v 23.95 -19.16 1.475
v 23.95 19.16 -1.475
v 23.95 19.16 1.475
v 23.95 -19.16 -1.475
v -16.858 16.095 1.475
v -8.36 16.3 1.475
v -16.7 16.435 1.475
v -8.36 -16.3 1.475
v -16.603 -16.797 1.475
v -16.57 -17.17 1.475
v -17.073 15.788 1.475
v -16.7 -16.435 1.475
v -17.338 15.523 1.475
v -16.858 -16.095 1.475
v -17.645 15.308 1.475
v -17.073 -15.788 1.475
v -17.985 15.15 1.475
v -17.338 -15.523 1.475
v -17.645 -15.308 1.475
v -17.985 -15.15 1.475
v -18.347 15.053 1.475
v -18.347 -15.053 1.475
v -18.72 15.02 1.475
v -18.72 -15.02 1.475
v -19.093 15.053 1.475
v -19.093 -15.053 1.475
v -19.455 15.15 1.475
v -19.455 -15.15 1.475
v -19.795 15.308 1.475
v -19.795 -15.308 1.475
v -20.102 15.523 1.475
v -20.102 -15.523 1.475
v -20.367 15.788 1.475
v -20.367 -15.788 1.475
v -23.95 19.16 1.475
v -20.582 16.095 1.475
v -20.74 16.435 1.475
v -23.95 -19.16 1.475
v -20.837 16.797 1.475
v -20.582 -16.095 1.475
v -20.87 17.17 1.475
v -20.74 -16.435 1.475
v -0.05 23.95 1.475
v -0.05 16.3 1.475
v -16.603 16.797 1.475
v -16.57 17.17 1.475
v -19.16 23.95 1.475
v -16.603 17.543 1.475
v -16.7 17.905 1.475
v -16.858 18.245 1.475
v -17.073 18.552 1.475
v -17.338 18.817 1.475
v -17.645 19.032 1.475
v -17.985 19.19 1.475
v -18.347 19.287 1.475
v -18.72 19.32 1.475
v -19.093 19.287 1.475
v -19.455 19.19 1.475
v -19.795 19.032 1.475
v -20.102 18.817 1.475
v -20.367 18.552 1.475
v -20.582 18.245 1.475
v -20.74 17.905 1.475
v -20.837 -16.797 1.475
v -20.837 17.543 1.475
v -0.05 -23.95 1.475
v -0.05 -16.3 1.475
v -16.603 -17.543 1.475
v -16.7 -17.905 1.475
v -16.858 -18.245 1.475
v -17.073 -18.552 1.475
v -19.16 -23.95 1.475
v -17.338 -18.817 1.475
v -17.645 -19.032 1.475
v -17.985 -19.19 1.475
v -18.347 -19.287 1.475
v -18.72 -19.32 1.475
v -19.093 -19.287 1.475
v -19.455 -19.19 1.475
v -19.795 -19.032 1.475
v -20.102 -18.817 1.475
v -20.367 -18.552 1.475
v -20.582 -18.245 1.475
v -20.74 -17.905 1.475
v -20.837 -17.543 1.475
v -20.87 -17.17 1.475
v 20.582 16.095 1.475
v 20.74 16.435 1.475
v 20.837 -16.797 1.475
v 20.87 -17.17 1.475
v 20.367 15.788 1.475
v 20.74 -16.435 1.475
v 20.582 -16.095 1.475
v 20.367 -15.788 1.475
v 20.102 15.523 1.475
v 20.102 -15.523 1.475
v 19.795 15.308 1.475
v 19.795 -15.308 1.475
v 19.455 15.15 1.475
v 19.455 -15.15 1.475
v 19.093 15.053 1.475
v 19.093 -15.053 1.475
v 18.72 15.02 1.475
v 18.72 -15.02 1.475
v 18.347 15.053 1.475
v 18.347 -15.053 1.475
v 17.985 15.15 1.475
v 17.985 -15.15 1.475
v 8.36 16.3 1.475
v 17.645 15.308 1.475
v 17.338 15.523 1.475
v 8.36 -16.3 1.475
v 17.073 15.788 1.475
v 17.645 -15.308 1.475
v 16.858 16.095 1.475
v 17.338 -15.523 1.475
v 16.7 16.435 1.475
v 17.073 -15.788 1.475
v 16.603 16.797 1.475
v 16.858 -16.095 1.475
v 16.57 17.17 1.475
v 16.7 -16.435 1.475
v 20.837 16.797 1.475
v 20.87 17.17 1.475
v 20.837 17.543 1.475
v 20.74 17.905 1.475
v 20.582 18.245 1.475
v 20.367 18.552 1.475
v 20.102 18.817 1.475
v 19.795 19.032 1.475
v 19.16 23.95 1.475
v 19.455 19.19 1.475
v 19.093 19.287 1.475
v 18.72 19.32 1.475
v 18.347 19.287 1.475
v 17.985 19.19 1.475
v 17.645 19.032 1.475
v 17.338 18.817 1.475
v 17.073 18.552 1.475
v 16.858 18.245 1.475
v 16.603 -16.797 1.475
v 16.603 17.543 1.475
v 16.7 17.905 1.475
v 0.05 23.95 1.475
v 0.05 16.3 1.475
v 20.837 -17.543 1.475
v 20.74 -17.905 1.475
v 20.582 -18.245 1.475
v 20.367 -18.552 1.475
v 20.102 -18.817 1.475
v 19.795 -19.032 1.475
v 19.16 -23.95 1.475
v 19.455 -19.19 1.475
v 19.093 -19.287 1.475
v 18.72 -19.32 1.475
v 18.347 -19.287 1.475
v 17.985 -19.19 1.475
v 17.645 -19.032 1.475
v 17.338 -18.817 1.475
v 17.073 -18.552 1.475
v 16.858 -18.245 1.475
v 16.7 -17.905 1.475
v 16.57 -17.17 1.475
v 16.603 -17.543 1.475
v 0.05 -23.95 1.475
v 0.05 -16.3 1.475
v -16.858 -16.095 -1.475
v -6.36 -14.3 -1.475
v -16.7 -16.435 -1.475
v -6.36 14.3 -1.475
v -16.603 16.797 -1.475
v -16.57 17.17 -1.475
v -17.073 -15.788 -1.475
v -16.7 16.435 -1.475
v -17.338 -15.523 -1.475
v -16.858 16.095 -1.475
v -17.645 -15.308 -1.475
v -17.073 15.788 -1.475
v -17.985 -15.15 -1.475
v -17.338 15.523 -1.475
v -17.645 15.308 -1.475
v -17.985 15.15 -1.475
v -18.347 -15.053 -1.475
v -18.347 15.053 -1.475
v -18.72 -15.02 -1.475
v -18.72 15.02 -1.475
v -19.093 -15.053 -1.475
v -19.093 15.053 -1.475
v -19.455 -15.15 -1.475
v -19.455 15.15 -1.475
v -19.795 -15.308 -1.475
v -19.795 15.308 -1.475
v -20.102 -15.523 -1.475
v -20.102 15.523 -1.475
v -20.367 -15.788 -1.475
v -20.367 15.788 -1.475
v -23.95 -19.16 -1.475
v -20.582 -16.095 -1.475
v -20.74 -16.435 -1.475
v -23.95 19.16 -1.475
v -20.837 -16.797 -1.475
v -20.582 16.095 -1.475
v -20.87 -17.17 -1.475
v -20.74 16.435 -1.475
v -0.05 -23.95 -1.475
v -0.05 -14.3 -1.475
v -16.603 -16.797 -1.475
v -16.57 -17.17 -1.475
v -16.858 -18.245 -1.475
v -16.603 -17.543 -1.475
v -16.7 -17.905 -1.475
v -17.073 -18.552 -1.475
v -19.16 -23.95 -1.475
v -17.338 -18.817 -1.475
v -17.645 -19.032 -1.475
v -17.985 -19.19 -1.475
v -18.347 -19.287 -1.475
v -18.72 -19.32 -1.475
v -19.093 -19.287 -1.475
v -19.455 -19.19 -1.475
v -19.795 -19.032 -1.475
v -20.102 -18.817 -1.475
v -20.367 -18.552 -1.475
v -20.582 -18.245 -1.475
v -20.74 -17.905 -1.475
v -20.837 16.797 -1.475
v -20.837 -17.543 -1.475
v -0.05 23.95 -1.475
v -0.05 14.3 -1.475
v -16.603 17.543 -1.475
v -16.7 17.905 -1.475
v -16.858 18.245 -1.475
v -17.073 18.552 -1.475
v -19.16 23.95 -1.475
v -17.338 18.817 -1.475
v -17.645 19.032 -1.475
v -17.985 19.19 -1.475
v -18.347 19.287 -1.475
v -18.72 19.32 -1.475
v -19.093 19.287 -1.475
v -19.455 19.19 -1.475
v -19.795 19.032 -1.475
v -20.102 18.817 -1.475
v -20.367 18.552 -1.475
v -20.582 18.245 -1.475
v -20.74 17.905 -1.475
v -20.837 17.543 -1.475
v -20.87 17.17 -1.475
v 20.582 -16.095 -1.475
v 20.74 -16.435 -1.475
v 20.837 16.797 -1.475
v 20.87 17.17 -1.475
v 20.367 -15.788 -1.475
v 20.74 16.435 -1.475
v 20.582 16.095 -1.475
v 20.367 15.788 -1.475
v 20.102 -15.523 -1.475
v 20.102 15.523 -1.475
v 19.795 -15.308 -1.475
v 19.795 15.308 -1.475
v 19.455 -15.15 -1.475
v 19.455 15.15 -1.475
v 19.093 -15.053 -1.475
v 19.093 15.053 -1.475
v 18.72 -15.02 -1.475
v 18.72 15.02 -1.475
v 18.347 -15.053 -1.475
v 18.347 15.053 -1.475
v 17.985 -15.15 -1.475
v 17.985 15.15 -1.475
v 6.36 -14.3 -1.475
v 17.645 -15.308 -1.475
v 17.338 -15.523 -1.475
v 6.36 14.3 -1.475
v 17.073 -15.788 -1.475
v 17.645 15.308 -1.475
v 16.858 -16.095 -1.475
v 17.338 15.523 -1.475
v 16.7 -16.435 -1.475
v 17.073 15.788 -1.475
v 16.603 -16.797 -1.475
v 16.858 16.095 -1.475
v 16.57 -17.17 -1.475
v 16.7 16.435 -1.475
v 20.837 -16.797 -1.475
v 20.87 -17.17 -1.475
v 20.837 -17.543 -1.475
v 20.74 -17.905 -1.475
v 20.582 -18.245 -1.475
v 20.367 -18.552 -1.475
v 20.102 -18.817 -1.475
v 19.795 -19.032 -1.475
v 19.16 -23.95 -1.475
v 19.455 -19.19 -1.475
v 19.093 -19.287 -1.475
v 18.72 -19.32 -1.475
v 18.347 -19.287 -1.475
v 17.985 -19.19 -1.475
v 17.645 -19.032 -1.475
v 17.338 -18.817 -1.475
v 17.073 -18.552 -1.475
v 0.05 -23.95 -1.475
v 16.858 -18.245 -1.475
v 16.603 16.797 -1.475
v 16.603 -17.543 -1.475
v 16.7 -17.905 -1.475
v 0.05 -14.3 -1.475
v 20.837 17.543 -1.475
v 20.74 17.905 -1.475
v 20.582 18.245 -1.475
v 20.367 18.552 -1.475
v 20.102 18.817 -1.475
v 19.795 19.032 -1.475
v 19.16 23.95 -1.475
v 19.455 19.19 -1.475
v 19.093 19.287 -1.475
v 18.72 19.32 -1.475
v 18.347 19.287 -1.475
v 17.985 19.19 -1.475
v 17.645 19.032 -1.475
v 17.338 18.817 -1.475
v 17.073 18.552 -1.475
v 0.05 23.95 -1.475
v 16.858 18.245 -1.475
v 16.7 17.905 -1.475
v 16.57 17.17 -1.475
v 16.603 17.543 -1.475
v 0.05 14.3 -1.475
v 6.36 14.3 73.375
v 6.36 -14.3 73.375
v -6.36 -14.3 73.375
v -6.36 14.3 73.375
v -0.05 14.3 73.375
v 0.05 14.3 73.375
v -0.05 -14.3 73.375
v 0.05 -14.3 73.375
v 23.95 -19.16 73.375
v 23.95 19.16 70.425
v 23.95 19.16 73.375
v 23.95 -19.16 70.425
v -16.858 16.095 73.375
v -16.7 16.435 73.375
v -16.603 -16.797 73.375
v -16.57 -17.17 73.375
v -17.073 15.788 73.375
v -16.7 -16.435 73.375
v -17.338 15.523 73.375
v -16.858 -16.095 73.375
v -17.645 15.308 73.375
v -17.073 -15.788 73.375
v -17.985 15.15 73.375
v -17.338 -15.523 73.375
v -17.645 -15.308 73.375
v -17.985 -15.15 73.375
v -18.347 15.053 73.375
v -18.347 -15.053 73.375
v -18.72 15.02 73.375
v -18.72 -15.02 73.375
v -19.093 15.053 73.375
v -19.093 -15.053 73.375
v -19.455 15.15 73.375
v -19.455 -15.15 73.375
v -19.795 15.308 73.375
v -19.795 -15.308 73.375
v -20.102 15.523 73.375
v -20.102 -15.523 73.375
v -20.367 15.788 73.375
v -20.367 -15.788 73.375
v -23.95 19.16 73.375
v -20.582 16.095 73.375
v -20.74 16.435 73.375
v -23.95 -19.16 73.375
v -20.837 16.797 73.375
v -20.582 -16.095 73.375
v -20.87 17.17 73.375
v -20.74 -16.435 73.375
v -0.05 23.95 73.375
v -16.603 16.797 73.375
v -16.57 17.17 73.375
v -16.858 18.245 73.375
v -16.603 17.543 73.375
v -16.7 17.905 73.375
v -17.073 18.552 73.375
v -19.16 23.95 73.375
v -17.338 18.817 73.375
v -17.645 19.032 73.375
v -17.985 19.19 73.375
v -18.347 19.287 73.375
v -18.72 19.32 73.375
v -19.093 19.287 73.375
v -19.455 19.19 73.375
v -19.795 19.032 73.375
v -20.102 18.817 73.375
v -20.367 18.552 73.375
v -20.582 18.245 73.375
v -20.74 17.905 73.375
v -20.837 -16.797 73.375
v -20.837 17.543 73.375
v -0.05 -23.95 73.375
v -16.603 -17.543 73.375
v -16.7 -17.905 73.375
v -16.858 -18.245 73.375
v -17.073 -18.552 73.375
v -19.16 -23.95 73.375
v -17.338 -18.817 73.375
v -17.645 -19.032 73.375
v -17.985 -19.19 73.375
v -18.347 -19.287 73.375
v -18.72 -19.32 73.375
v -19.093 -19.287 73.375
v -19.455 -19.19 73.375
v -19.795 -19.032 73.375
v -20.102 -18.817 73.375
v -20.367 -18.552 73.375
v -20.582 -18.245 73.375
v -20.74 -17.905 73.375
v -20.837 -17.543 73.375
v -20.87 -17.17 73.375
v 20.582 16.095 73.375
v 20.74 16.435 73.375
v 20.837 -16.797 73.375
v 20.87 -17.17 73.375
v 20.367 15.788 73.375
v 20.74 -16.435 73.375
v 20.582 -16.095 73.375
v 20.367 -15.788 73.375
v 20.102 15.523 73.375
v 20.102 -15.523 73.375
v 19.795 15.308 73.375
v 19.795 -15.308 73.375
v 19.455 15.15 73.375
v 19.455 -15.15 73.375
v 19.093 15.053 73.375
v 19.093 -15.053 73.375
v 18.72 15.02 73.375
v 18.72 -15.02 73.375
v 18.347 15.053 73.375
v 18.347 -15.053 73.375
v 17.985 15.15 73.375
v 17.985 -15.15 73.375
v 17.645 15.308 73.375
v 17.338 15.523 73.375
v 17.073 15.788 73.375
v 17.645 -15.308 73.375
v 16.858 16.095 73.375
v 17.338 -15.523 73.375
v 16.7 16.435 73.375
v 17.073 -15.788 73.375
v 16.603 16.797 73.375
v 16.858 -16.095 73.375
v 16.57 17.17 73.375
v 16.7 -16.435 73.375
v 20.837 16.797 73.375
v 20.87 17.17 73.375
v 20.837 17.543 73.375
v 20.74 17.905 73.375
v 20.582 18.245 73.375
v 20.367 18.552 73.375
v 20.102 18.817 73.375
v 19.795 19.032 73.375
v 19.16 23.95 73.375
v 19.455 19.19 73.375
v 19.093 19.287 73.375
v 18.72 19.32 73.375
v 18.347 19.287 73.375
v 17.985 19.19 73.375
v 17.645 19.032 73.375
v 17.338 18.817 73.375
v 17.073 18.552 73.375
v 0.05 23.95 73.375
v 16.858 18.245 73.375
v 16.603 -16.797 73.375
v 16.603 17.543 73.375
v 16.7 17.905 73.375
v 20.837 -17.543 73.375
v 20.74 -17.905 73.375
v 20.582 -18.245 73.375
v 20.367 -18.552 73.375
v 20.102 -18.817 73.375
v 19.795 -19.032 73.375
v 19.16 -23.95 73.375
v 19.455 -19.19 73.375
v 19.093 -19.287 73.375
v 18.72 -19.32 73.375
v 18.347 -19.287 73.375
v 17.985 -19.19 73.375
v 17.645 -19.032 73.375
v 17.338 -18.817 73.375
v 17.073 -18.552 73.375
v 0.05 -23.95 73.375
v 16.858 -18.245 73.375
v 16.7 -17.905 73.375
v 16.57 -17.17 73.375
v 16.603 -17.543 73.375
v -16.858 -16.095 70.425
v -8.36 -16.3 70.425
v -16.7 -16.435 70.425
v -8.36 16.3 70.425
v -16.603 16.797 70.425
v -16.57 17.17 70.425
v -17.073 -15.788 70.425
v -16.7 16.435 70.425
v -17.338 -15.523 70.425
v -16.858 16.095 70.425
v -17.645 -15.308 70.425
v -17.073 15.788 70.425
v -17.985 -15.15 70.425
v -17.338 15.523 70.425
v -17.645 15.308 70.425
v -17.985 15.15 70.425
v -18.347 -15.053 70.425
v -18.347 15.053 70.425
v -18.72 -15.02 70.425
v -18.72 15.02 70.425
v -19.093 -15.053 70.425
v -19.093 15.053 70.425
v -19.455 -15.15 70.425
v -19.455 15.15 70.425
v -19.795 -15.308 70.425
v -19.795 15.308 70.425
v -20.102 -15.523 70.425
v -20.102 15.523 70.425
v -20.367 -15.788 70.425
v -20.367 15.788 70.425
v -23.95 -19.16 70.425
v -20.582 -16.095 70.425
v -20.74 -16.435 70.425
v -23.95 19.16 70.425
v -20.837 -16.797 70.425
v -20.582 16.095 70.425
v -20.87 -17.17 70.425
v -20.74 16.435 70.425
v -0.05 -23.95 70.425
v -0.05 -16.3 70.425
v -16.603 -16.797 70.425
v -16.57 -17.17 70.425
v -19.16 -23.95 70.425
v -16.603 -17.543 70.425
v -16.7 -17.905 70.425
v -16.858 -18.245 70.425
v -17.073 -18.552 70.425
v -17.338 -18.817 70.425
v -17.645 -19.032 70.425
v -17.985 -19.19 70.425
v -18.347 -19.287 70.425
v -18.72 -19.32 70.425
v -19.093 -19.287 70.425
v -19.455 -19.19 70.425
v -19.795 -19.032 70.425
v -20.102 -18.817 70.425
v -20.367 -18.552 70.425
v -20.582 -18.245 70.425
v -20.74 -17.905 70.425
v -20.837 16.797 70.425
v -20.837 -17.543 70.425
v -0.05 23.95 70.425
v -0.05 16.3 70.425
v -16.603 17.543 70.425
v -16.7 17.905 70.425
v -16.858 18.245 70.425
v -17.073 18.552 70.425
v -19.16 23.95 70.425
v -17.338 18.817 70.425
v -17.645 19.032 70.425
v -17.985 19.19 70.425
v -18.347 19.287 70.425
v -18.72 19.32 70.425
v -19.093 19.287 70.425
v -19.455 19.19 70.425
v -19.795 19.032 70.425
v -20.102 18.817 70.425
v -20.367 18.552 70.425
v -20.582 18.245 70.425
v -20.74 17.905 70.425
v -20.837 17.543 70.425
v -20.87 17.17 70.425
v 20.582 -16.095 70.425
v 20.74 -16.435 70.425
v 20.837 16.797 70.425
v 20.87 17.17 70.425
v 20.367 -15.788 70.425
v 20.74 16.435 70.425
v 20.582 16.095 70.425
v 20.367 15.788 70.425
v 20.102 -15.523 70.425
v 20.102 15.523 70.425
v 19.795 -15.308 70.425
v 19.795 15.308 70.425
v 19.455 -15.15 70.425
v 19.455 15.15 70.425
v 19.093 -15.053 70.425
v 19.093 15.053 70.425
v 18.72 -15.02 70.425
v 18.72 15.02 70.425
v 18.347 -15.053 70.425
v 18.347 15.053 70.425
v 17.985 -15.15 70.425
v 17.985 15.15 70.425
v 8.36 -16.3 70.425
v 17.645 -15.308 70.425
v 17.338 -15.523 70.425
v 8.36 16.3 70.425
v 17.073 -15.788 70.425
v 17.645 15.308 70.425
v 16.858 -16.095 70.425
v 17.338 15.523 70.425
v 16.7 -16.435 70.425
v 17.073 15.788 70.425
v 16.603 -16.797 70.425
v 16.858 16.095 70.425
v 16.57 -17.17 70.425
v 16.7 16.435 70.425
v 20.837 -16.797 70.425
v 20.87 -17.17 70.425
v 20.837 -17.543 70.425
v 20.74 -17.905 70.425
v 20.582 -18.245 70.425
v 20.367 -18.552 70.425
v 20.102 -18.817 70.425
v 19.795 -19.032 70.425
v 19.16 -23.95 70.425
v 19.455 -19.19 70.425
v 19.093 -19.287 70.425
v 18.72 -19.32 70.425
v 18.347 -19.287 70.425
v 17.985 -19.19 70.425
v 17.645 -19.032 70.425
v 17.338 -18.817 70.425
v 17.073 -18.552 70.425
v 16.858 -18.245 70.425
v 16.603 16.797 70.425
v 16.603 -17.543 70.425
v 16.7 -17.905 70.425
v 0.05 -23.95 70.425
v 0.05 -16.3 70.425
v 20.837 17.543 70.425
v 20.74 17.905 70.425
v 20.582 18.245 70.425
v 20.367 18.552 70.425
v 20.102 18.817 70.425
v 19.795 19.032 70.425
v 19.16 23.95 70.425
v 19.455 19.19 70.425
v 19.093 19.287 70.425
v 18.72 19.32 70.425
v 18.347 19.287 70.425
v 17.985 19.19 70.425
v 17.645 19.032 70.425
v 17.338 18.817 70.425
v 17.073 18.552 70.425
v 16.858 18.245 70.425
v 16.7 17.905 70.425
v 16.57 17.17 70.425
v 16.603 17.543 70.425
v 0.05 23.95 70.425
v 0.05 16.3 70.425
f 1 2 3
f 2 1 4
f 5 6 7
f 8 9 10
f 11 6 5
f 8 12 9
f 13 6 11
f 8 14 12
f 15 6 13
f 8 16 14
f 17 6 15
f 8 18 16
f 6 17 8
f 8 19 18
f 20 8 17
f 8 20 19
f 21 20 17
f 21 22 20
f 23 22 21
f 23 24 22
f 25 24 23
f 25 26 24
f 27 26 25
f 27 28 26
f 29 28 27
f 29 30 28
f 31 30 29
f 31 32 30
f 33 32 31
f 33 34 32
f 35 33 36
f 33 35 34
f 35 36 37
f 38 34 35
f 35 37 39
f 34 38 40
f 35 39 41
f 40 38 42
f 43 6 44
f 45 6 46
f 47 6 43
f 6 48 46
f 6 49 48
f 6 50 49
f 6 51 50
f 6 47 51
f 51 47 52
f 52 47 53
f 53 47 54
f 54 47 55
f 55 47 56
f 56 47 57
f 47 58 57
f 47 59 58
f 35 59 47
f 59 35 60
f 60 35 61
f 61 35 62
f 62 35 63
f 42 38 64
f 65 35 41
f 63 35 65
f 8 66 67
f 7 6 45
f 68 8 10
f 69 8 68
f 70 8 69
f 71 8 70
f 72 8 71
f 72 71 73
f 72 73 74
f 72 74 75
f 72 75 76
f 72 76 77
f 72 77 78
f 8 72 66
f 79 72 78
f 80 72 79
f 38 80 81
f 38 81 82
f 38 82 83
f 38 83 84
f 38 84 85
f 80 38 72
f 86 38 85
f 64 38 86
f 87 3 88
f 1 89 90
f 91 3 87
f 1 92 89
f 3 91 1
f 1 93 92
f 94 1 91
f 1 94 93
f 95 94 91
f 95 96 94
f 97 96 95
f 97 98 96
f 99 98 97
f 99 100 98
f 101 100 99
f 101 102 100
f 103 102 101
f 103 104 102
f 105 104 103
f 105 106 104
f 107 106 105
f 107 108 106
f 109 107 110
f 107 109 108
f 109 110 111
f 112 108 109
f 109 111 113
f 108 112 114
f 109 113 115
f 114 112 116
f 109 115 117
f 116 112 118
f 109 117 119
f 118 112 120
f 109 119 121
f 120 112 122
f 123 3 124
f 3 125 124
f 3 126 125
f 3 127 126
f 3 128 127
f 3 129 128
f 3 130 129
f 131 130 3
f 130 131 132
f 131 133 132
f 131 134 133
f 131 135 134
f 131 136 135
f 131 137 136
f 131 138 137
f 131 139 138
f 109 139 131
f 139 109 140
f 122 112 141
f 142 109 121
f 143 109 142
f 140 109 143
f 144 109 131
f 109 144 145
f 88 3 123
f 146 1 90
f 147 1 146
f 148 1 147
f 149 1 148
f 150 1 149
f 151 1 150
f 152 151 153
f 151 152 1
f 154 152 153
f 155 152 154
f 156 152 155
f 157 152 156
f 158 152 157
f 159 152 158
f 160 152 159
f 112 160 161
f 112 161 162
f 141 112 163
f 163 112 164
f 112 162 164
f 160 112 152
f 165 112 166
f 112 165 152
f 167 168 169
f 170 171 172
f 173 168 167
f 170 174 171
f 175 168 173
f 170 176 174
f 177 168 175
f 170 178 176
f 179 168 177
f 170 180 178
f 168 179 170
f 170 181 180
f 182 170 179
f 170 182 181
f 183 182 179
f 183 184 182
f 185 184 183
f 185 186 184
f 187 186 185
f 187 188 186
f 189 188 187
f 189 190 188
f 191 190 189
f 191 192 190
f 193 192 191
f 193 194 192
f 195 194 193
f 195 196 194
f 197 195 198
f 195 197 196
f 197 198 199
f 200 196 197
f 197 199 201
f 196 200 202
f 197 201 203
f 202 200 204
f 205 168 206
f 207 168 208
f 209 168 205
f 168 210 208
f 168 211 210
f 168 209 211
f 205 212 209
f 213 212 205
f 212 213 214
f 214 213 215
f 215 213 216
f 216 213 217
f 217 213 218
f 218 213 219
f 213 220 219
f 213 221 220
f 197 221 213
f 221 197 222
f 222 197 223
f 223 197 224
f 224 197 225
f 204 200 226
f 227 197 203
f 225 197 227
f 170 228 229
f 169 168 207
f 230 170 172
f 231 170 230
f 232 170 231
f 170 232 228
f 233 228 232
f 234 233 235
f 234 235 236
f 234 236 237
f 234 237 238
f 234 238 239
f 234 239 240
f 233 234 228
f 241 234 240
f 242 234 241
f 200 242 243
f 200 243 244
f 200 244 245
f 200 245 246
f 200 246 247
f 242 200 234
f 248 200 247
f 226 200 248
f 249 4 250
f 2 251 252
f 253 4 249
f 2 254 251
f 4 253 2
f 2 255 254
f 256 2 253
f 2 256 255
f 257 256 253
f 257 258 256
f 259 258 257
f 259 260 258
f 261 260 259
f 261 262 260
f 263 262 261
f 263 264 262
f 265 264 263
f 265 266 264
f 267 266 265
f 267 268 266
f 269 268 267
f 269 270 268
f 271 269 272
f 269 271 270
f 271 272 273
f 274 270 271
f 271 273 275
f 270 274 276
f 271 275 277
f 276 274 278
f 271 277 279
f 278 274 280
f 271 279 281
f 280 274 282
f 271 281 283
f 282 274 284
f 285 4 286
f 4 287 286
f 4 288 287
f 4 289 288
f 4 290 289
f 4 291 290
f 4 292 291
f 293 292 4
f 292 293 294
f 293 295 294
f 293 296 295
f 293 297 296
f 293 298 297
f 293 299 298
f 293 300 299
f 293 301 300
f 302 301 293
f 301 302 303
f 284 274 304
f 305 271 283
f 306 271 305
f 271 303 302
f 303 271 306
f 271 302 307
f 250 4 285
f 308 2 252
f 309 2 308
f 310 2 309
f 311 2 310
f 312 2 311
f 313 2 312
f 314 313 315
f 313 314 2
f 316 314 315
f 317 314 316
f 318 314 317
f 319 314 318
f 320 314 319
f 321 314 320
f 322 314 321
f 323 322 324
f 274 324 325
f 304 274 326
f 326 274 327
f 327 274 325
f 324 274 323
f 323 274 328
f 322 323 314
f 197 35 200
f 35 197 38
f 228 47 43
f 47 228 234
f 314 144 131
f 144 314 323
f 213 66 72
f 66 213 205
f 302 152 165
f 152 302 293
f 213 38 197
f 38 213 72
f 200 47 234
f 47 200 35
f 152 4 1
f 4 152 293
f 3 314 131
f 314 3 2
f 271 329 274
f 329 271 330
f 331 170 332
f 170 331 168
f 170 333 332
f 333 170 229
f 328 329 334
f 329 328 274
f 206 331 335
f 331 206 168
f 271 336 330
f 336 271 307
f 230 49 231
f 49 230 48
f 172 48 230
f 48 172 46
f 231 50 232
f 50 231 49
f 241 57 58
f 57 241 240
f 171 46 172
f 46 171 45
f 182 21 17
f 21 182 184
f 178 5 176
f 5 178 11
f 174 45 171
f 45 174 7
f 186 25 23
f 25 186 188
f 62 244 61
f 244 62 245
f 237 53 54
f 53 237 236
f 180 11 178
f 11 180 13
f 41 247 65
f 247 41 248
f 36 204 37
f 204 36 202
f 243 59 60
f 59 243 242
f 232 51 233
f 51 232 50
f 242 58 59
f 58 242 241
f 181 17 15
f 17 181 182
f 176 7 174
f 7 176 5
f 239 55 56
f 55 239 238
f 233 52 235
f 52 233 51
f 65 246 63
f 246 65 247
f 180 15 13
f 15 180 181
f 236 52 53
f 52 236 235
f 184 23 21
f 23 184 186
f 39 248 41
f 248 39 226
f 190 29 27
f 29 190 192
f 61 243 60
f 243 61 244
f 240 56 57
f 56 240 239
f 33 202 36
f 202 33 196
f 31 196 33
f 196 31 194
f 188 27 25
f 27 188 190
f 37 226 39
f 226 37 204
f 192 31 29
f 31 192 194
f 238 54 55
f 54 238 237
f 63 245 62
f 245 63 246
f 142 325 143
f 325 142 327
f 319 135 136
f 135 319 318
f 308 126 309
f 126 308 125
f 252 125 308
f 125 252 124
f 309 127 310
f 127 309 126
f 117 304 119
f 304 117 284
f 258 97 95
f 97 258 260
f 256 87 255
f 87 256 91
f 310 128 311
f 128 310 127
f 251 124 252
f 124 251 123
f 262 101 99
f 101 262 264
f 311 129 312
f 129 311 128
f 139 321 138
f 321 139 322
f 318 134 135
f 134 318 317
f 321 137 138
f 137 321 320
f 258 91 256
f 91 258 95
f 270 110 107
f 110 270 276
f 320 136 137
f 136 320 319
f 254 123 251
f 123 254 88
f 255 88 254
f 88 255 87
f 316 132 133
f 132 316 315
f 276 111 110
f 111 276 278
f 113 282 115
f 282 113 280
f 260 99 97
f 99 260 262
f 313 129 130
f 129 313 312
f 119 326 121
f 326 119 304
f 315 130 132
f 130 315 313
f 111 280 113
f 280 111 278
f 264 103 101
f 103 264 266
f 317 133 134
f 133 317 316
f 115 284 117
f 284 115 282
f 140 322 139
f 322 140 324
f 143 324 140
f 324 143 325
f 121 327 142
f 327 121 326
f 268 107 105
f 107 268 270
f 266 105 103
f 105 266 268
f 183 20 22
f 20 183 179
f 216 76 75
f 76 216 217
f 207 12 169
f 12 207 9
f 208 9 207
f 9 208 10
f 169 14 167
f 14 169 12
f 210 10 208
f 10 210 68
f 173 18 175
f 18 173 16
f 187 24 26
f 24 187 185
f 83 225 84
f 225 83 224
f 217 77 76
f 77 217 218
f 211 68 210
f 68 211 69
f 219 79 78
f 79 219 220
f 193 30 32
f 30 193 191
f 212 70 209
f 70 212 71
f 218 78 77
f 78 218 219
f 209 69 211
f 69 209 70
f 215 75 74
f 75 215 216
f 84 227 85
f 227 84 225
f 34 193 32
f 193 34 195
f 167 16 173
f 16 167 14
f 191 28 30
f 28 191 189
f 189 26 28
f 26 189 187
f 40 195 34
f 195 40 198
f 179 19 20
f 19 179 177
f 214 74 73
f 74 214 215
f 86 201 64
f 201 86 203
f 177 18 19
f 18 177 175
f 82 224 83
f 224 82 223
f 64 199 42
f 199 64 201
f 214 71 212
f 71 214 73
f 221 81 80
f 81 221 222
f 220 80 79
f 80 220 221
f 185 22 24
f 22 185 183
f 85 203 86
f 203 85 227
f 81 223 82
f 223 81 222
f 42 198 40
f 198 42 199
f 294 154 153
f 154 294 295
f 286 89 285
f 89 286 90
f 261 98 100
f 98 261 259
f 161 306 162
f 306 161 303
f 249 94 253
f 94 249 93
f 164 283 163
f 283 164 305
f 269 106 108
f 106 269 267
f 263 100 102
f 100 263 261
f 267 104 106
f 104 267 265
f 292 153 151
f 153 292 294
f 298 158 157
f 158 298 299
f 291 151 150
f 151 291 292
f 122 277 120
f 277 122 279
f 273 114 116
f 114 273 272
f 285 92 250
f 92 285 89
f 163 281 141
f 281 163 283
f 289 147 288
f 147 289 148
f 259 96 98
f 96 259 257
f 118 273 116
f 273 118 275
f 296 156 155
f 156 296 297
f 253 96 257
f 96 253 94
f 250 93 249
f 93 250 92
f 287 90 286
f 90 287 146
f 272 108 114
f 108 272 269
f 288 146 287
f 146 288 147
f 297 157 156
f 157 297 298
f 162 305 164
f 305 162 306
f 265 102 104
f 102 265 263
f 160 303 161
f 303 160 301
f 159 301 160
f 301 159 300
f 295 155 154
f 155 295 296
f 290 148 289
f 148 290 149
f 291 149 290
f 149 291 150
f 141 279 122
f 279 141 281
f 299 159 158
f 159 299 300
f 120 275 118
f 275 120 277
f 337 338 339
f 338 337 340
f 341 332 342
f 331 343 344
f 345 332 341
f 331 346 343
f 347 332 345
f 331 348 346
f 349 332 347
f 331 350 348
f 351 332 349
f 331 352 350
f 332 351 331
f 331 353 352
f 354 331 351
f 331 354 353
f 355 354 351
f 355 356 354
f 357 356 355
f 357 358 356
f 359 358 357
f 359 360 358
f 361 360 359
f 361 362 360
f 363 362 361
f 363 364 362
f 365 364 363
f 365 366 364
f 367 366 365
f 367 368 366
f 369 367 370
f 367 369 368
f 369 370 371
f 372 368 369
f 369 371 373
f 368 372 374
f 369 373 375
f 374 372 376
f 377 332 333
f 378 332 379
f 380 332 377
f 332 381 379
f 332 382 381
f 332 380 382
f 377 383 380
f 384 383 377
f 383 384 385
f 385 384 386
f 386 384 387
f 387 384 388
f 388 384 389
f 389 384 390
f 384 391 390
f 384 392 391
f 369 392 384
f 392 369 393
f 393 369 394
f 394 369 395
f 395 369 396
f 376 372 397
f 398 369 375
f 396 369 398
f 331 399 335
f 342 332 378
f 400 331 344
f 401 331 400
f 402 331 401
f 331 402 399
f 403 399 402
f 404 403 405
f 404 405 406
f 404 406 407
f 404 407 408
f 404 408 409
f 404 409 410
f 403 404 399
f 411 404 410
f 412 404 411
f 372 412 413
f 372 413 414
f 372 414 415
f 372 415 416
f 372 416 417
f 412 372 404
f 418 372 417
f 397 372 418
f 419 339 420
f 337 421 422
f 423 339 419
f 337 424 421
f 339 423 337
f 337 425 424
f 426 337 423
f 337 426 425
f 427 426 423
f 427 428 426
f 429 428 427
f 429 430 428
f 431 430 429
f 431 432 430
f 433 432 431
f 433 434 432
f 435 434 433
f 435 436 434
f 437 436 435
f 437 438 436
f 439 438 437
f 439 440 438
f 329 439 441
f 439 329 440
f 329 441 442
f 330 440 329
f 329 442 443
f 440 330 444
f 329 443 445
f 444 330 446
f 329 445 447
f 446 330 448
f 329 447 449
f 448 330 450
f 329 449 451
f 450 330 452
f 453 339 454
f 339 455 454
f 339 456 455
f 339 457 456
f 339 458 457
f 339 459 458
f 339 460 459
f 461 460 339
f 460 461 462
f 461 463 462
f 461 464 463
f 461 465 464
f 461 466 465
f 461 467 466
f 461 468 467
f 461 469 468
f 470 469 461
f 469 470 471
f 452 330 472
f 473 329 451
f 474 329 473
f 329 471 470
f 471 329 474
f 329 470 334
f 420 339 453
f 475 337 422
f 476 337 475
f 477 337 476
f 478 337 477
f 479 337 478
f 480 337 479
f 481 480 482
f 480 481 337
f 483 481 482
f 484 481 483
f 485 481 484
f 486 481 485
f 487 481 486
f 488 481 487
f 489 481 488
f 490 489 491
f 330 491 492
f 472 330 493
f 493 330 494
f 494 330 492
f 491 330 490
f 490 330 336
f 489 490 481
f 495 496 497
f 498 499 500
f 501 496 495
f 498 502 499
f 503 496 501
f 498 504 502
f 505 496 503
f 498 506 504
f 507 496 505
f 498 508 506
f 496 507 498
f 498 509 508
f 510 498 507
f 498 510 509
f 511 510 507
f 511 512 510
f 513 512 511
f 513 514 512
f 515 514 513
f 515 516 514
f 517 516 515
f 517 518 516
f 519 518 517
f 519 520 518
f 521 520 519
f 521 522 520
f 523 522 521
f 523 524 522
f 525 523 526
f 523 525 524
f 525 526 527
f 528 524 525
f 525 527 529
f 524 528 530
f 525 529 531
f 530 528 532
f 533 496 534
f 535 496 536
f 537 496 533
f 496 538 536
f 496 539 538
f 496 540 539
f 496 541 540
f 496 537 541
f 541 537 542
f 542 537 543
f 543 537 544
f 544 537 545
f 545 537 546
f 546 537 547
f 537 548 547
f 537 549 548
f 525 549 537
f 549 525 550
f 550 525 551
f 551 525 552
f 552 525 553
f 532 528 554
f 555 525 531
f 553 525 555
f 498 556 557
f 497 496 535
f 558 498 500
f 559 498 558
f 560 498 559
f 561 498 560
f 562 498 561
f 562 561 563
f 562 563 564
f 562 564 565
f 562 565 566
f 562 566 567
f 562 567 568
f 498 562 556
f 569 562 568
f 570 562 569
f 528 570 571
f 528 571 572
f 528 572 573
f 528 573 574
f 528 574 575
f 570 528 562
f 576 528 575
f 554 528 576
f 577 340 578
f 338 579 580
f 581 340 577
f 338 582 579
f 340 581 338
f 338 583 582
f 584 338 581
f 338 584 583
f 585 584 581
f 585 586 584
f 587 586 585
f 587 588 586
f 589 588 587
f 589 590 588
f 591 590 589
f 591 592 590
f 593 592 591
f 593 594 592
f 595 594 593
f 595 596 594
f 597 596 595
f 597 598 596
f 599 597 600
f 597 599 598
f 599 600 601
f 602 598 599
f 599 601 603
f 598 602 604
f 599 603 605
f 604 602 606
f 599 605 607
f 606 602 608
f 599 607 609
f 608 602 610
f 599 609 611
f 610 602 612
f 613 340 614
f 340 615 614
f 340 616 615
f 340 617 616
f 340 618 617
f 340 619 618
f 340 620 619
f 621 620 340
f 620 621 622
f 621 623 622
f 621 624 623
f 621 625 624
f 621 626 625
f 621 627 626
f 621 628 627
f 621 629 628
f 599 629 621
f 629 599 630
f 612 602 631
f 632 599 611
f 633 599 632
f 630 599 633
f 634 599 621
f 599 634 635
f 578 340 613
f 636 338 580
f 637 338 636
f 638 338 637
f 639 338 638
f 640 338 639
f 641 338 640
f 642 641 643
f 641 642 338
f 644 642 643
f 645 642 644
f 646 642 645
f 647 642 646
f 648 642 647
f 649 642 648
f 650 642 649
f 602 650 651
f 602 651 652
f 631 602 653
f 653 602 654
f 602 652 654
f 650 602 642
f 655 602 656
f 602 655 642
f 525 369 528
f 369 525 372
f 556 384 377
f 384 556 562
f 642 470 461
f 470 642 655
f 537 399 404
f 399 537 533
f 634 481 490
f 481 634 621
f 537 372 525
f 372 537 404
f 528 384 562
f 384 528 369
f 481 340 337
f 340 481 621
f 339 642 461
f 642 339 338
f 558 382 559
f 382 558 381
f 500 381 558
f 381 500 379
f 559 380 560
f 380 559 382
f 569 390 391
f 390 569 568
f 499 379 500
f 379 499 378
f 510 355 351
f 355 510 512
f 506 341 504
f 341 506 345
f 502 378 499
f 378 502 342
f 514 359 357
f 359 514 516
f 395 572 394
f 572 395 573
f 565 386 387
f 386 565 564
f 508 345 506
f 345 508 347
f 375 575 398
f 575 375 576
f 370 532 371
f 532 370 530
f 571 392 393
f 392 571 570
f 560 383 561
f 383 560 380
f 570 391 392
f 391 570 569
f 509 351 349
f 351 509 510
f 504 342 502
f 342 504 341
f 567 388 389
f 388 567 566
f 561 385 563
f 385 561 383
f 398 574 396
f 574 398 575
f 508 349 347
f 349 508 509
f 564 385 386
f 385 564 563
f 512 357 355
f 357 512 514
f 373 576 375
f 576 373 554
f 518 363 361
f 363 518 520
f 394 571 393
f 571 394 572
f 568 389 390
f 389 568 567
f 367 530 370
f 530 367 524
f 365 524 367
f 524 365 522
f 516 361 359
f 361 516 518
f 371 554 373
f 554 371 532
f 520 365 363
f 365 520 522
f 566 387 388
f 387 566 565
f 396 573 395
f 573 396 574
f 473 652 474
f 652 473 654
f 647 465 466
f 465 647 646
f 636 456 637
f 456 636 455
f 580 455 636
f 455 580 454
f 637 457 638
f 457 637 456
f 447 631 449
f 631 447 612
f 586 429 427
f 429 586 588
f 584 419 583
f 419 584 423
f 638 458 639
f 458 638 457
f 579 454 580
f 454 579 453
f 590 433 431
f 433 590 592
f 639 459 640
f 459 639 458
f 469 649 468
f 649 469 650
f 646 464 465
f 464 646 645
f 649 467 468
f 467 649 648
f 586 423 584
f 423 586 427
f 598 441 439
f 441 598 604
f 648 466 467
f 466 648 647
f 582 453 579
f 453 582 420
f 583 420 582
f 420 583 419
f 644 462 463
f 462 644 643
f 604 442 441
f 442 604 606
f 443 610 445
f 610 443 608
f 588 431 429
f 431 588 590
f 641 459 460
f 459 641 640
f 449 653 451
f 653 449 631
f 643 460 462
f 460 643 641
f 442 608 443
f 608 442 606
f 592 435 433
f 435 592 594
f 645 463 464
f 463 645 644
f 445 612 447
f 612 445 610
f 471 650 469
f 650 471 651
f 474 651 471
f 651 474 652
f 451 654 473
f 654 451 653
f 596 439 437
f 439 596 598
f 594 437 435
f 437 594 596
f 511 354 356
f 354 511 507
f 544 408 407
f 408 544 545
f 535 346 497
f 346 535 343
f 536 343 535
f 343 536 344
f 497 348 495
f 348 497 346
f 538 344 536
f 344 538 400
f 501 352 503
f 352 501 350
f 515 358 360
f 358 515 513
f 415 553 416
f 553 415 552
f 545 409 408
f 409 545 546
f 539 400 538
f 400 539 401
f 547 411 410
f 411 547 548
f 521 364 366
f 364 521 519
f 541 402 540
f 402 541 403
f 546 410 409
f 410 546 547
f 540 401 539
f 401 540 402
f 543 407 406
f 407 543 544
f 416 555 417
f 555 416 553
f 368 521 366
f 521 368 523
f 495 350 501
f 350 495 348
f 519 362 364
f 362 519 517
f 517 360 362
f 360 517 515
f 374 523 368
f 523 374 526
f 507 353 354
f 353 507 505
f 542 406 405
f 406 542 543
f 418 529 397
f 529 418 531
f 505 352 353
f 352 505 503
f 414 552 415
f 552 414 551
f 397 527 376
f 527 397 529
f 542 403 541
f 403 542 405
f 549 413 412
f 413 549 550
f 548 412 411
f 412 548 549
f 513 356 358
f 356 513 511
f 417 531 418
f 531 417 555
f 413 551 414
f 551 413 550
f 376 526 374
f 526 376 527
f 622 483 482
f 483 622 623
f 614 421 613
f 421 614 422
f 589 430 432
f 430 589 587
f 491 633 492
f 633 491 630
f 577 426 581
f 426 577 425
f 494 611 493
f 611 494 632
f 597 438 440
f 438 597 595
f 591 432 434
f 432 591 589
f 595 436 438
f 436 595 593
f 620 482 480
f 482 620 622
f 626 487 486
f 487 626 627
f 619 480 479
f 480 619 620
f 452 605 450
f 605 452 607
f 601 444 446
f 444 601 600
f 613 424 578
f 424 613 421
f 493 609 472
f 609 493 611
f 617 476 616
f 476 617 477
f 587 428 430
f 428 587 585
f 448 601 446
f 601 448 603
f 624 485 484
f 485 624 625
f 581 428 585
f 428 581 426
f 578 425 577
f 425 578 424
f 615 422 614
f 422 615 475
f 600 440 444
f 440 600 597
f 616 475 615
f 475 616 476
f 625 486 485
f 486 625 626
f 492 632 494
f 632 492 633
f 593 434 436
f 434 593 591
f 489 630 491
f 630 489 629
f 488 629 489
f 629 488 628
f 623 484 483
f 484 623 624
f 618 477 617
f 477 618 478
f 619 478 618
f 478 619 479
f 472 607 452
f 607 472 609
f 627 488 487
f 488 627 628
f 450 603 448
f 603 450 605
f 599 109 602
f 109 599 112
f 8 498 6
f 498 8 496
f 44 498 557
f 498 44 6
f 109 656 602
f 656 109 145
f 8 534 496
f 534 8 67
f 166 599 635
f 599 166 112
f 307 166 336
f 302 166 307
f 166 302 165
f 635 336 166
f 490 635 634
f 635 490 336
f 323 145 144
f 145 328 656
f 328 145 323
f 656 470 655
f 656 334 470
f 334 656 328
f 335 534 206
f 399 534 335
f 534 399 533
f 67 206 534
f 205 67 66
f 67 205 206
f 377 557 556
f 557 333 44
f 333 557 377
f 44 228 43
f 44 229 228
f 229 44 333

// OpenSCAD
// file: common.scad
/**********************************************************************
 * Common waveguide code                                              *
 * NOTE: Must be included AFTER setting waveguide parameters          *
 * Perhaps in the future it could be useful to allow passing in these *
 * parameters to the modules themselves, removing this requirement.   *
 **********************************************************************/


/*             WR112   WR90   WR75   WR62   WR51   WR42   WR34  WR28 */
wrtab    = [0, 112,    90,    75,    62,    51,    42,    34,   28   ]*1.0; /* Waveguide type */
fstab    = [0,  47.9,  41.4,  38.3,  33.3,  31.0,  22.41, 22.1, 19.05]*1.0; /* Flange size */
fhstab   = [0,  18.72, 16.26, 14.25, 12.14, 11.25,  8.51,  7.9,  6.73]*1.0; /* Hole spacing short side */
fhltab   = [0,  17.17, 15.49, 13.21, 12.63, 10.29,  8.13,  7.5,  6.34]*1.0; /* Hole spacing long side */
drilltab = [0,   4.3,   4.3,   4.1,   4.1,   4.1,   3.1,   3.1,  3.0 ]*1.0; /* Hole size */
/* Not all waveguide opening sizes correspong 100% to the waveguide number */
wgatab   = [0,  28.50, 22.86, 19.05, 15.80, 12.95, 10.67,  8.64, 7.11]*1.0; /* Waveguide opening size A */
wgbtab   = [0,  12.62, 10.16,  9.53,  7.90,  6.48,  4.32,  4.32, 3.56]*1.0; /* Waveguide opening size B */


flange_size   = fstab[wrcode];        /* Square size of flange */
flange_hole_s = fhstab[wrcode];       /* Hole spacing on short side */
flange_hole_l = fhltab[wrcode];       /* Hole spacing on long side */
flange_drill  = drilltab[wrcode]/2.0; /* Flange mounting hole size */

wgsize_a = wgatab[wrcode] + (trim * 2);
wgsize_b = wgbtab[wrcode] + (trim * 2);

// faces for precision
$fn=36; // faces for precision

/* Create a waveguide flange
 *   Heavily based on code from Rolf-Dieter Klein (www.rdklein.de)
 *   https://www.thingiverse.com/thing:161428
 */
module flange() {
    thickness = flanged - trim;

    difference() {
        difference() {
            intersection() {
                cube([flange_size, flange_size, thickness], center=true);
                rotate([0,0,45])
                    cube([flange_size*1.4142*0.9,flange_size*1.4142*0.9,thickness],center=true);
            }
            cube([wgsize_b,wgsize_a,wall*2],center=true);
        }
        /* Holes */
        translate([-flange_hole_s,  flange_hole_l, 0]) cylinder(h=thickness*1.1, r=flange_drill, center=true);
        translate([ flange_hole_s,  flange_hole_l, 0]) cylinder(h=thickness*1.1, r=flange_drill, center=true);
        translate([-flange_hole_s, -flange_hole_l, 0]) cylinder(h=thickness*1.1, r=flange_drill, center=true);
        translate([ flange_hole_s, -flange_hole_l, 0]) cylinder(h=thickness*1.1, r=flange_drill, center=true);
    }
}

/* Create a flangeless section of waveguide
 *   wg_len: Length of section, in mm
 */
module waveguide(wg_len) {
    translate([0,0,wg_len/2]) {
        difference() {
            cube([wgsize_b+wall*2, wgsize_a+wall*2, wg_len],          center=true);
            cube([wgsize_b,        wgsize_a,        wg_len + wall*.1],center=true);
        }
    }
}

/* Generate horn antenna
 *   length:  Length of horn
 *   theta_h: Angle of horn in magnetic field
 *   theta_e: Angle of horn in electric field
 *
 * Polyhedron code loosely based off of code from Rolf-Dieter Klein (www.rdklein.de)
 *   https://www.thingiverse.com/thing:161428
 */
module horn(length, theta_h, theta_e) {
    /* Depth of horn that ends up inside waveguide */
    d_a = wgsize_a / (2 * tan(theta_h));
    d_b = wgsize_b / (2 * tan(theta_e));

    /* Size of horn opening */
    sz_a = wgsize_a + (2 * length * tan(theta_h));
    sz_b = wgsize_b + (2 * length * tan(theta_e));

    difference() {
        polyhedron(
            points = [
                /* Wide end */
                [ sz_b/2 + wall,  sz_a/2 + wall, length],
                [ sz_b/2 + wall, -sz_a/2 - wall, length],
                [-sz_b/2 - wall, -sz_a/2 - wall, length],
                [-sz_b/2 - wall,  sz_a/2 + wall, length],
                /* Small end */
                [ wgsize_b/2 + wall,  wgsize_a/2 + wall, 0],
                [ wgsize_b/2 + wall, -wgsize_a/2 - wall, 0],
                [-wgsize_b/2 - wall, -wgsize_a/2 - wall, 0],
                [-wgsize_b/2 - wall,  wgsize_a/2 + wall, 0]
            ],
            faces = [
                [0,1,4],[1,2,5],[2,3,6],[3,0,7],
                [1,5,4],[2,6,5],[3,7,6],[0,4,7],
                [1,0,3],[2,1,3],[4,5,7],[5,6,7]
            ]
        );
        polyhedron(
            points = [
                /* Wide end */
                [ sz_b/2,  sz_a/2, length],
                [ sz_b/2, -sz_a/2, length],
                [-sz_b/2, -sz_a/2, length],
                [-sz_b/2,  sz_a/2, length],
                /* Small end */
                [ wgsize_b/2,  wgsize_a/2, 0],
                [ wgsize_b/2, -wgsize_a/2, 0],
                [-wgsize_b/2, -wgsize_a/2, 0],
                [-wgsize_b/2,  wgsize_a/2, 0]
            ],
            faces = [
                [0,1,4],[1,2,5],[2,3,6],[3,0,7],
                [1,5,4],[2,6,5],[3,7,6],[0,4,7],
                [1,0,3],[2,1,3],[4,5,7],[5,6,7]
            ]
        );
    }
}

/* Generate an ideal horn antenna for a given wavelength
 *   l_h: Length of horn in magnetic field direction
 *   l_e: Length of horn in electric field direction
 *   wavelength: Design wavelength
 *
 * Both l_h and l_e include the portion of the antenna that would end up inside
 * the waveguide if both sides of the horn were extended until they meet.
 */
module ideal_horn(l_h, l_e, wavelength) {
    theta_e = asin(sqrt(2 * wavelength * l_e) / (2 * l_e));
    theta_h = asin(sqrt(3 * wavelength * l_h) / (2 * l_h));

    /* Not sure if min is good, but whatever. Maybe I should rewrite this to just produce the horn directly */
    length_e = (l_e * cos(theta_e)) - (wgsize_b / (2 * tan(theta_e)));
    length_h = (l_h * cos(theta_h)) - (wgsize_a / (2 * tan(theta_h)));
    echo("Len_E: ", length_e, "Len_H", length_h);
    length = min(length_e, length_h);

    horn(length, theta_h, theta_e);
}
// main file
/*******************************
 * Waveguide section generator *
 *******************************/

/********************
 * Variables/Inputs *
 ********************/

/* Waveguide selection */
wrcode = 1;

/* Waveguide wall thickness */
wall = 2;

/* Flange thickness */
flanged = 3;

/* Length of waveguide section, including flanges */
length = 75;

/* Amount to trim back internal and mating surfaces, for the purpose of accounting for metallic tape or coating. */
trim = 0.05;

/* Set to 1 to split waveguide along short side of section. This can make coating inside of waveguide much easier. */
split_part = 1;



/******************************************************************************/

/* Import waveguide components */
include <common.scad>

difference() {
    union() {
        flange();
        translate([0, 0, (length - flanged) - (2 * trim)]) flange();

        waveguide((length - flanged));

    }

    if(split_part) {
        translate([-trim, -wgsize_a*2, -flanged])
            cube([trim * 2, wgsize_a*4, length*1.5]);
    }
}
